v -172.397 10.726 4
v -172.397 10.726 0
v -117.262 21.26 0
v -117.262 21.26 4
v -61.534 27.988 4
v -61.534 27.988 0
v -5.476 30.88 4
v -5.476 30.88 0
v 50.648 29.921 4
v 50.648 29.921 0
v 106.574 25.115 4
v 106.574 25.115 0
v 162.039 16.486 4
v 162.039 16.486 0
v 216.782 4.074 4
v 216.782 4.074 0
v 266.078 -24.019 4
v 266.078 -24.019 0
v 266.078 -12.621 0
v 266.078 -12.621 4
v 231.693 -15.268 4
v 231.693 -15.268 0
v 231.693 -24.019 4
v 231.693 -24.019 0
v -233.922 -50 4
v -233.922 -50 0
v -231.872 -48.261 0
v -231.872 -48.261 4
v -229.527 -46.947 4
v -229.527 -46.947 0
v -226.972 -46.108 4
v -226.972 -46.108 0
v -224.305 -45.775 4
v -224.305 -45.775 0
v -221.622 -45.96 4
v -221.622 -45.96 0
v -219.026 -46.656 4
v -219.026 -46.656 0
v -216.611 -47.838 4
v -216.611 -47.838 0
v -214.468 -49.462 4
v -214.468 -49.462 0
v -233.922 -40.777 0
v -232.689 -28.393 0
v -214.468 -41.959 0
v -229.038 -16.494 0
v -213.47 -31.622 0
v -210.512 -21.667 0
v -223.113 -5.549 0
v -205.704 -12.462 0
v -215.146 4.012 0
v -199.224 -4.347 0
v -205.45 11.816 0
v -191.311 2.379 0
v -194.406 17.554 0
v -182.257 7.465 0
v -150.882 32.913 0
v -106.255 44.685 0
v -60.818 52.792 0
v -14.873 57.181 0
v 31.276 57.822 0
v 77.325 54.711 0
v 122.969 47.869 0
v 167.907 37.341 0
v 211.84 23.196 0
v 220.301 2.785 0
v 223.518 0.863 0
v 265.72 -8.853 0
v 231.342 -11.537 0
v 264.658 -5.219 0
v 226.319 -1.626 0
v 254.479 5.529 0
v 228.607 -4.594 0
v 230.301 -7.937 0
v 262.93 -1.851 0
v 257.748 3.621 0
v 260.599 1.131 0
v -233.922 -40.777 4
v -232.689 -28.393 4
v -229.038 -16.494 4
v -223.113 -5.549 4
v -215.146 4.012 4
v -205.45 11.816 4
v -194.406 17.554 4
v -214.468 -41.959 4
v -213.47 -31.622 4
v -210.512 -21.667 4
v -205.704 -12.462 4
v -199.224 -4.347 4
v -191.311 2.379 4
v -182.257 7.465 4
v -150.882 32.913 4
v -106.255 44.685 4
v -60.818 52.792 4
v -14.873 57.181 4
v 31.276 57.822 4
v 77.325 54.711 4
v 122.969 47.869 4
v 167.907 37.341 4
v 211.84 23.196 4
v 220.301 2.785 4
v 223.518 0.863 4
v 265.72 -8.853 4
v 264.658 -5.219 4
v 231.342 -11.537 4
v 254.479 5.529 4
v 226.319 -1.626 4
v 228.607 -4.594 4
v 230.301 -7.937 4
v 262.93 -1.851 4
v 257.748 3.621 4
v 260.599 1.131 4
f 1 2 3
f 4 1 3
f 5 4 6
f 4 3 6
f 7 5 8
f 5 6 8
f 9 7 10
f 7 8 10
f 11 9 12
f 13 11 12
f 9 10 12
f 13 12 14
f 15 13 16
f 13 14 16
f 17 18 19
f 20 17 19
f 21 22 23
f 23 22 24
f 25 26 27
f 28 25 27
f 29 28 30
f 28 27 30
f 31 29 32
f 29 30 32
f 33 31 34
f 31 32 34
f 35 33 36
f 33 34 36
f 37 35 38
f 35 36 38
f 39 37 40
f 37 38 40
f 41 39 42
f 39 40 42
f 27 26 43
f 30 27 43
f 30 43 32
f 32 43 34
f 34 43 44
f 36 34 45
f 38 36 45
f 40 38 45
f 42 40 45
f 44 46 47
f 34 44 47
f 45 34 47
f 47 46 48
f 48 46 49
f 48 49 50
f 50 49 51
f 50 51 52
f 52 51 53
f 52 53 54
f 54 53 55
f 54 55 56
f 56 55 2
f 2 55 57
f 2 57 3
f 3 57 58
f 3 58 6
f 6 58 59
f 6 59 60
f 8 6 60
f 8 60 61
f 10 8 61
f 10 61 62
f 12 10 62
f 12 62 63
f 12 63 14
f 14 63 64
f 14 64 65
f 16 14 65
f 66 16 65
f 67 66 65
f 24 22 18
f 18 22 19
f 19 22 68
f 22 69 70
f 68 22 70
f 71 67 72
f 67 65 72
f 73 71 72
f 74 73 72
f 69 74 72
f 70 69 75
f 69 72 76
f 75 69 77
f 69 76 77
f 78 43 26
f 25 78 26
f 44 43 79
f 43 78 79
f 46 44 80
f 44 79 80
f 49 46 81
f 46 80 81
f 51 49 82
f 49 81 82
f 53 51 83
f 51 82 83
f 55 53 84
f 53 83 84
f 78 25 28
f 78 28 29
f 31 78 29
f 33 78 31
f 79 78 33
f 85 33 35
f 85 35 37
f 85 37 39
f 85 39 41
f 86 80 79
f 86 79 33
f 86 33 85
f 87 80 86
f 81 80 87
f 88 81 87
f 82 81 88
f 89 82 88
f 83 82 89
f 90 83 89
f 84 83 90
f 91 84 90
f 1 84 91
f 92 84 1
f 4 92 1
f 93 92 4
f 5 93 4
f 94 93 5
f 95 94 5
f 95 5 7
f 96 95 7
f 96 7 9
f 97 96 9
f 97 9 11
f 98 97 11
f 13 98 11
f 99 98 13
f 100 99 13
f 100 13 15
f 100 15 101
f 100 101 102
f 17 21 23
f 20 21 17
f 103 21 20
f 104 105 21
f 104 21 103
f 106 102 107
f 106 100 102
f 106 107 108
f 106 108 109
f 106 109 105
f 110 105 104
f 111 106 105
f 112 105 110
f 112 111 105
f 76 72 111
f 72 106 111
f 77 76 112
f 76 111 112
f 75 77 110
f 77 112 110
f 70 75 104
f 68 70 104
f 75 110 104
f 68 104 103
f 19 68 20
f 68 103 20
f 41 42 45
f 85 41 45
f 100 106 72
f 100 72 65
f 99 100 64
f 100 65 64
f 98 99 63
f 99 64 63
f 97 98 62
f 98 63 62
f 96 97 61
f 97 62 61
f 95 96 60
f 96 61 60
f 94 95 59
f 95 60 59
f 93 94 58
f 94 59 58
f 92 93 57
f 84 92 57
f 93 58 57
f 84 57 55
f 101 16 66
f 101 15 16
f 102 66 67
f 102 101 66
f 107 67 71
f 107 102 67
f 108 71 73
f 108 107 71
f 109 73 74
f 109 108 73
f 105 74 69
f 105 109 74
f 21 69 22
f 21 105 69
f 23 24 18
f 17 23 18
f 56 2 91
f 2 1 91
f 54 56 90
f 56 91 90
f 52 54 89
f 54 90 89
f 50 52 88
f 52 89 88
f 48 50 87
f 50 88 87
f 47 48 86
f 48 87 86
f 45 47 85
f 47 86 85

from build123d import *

# Parameters (mm, degrees)
F1_DEPTH = 4
F2_R     = 54.0232948569
F3_R     = 62.809614709
F4_W     = 34.3843554476
F4_H     = 20.342006709
F5_DEPTH = 4
F7_R     = 20


with BuildPart() as f1:
    # F0 (on Top) → F1 (new body)
    with BuildSketch(Plane.XY):
        with BuildLine():
            ThreePointArc((-214.4679278135, 0), (8.6127225609, 31.0011100466), (231.6933729353, 0))
            Line((231.6933729353, 0), (231.6933729353, -24.0185298026))
            Line((231.6933729353, -24.0185298026), (266.0777283828, -24.0185298026))
            Line((266.0777283828, -24.0185298026), (266.0777283828, 0))
            ThreePointArc((266.0777283828, 0), (16.0777283828, 58.0256148842), (-233.9222716172, 0))
            Line((-233.9222716172, 0), (-233.9222716172, -50))
            ThreePointArc((-233.9222716172, -50), (-224.3045684517, -45.7747103429), (-214.4679278135, -49.461685773))
            Line((-214.4679278135, -49.461685773), (-214.4679278135, 0))
        make_face()
    extrude(amount=F1_DEPTH)

    # F2
    f2_edges = [f1.edges().sort_by_distance(p)[0] for p in [
        (-214.467928, 0, 2),
    ]]
    fillet(f2_edges, radius=F2_R)

    # F3
    f3_edges = [f1.edges().sort_by_distance(p)[0] for p in [
        (-233.922272, 0, 2),
    ]]
    fillet(f3_edges, radius=F3_R)

    # F7
    f7_edges = [f1.edges().sort_by_distance(p)[0] for p in [
        (266.077728, 0, 2),
        (231.693373, 0, 2),
    ]]
    fillet(f7_edges, radius=F7_R)


with BuildPart() as f5:
    # F4 (on face) → F5 (new body)
    with BuildSketch(Plane.XY.offset(4)):
        with Locations((248.885550659, -10.1710033545)):
            Rectangle(F4_W, F4_H)
    extrude(amount=F5_DEPTH)


solid = f1.part
